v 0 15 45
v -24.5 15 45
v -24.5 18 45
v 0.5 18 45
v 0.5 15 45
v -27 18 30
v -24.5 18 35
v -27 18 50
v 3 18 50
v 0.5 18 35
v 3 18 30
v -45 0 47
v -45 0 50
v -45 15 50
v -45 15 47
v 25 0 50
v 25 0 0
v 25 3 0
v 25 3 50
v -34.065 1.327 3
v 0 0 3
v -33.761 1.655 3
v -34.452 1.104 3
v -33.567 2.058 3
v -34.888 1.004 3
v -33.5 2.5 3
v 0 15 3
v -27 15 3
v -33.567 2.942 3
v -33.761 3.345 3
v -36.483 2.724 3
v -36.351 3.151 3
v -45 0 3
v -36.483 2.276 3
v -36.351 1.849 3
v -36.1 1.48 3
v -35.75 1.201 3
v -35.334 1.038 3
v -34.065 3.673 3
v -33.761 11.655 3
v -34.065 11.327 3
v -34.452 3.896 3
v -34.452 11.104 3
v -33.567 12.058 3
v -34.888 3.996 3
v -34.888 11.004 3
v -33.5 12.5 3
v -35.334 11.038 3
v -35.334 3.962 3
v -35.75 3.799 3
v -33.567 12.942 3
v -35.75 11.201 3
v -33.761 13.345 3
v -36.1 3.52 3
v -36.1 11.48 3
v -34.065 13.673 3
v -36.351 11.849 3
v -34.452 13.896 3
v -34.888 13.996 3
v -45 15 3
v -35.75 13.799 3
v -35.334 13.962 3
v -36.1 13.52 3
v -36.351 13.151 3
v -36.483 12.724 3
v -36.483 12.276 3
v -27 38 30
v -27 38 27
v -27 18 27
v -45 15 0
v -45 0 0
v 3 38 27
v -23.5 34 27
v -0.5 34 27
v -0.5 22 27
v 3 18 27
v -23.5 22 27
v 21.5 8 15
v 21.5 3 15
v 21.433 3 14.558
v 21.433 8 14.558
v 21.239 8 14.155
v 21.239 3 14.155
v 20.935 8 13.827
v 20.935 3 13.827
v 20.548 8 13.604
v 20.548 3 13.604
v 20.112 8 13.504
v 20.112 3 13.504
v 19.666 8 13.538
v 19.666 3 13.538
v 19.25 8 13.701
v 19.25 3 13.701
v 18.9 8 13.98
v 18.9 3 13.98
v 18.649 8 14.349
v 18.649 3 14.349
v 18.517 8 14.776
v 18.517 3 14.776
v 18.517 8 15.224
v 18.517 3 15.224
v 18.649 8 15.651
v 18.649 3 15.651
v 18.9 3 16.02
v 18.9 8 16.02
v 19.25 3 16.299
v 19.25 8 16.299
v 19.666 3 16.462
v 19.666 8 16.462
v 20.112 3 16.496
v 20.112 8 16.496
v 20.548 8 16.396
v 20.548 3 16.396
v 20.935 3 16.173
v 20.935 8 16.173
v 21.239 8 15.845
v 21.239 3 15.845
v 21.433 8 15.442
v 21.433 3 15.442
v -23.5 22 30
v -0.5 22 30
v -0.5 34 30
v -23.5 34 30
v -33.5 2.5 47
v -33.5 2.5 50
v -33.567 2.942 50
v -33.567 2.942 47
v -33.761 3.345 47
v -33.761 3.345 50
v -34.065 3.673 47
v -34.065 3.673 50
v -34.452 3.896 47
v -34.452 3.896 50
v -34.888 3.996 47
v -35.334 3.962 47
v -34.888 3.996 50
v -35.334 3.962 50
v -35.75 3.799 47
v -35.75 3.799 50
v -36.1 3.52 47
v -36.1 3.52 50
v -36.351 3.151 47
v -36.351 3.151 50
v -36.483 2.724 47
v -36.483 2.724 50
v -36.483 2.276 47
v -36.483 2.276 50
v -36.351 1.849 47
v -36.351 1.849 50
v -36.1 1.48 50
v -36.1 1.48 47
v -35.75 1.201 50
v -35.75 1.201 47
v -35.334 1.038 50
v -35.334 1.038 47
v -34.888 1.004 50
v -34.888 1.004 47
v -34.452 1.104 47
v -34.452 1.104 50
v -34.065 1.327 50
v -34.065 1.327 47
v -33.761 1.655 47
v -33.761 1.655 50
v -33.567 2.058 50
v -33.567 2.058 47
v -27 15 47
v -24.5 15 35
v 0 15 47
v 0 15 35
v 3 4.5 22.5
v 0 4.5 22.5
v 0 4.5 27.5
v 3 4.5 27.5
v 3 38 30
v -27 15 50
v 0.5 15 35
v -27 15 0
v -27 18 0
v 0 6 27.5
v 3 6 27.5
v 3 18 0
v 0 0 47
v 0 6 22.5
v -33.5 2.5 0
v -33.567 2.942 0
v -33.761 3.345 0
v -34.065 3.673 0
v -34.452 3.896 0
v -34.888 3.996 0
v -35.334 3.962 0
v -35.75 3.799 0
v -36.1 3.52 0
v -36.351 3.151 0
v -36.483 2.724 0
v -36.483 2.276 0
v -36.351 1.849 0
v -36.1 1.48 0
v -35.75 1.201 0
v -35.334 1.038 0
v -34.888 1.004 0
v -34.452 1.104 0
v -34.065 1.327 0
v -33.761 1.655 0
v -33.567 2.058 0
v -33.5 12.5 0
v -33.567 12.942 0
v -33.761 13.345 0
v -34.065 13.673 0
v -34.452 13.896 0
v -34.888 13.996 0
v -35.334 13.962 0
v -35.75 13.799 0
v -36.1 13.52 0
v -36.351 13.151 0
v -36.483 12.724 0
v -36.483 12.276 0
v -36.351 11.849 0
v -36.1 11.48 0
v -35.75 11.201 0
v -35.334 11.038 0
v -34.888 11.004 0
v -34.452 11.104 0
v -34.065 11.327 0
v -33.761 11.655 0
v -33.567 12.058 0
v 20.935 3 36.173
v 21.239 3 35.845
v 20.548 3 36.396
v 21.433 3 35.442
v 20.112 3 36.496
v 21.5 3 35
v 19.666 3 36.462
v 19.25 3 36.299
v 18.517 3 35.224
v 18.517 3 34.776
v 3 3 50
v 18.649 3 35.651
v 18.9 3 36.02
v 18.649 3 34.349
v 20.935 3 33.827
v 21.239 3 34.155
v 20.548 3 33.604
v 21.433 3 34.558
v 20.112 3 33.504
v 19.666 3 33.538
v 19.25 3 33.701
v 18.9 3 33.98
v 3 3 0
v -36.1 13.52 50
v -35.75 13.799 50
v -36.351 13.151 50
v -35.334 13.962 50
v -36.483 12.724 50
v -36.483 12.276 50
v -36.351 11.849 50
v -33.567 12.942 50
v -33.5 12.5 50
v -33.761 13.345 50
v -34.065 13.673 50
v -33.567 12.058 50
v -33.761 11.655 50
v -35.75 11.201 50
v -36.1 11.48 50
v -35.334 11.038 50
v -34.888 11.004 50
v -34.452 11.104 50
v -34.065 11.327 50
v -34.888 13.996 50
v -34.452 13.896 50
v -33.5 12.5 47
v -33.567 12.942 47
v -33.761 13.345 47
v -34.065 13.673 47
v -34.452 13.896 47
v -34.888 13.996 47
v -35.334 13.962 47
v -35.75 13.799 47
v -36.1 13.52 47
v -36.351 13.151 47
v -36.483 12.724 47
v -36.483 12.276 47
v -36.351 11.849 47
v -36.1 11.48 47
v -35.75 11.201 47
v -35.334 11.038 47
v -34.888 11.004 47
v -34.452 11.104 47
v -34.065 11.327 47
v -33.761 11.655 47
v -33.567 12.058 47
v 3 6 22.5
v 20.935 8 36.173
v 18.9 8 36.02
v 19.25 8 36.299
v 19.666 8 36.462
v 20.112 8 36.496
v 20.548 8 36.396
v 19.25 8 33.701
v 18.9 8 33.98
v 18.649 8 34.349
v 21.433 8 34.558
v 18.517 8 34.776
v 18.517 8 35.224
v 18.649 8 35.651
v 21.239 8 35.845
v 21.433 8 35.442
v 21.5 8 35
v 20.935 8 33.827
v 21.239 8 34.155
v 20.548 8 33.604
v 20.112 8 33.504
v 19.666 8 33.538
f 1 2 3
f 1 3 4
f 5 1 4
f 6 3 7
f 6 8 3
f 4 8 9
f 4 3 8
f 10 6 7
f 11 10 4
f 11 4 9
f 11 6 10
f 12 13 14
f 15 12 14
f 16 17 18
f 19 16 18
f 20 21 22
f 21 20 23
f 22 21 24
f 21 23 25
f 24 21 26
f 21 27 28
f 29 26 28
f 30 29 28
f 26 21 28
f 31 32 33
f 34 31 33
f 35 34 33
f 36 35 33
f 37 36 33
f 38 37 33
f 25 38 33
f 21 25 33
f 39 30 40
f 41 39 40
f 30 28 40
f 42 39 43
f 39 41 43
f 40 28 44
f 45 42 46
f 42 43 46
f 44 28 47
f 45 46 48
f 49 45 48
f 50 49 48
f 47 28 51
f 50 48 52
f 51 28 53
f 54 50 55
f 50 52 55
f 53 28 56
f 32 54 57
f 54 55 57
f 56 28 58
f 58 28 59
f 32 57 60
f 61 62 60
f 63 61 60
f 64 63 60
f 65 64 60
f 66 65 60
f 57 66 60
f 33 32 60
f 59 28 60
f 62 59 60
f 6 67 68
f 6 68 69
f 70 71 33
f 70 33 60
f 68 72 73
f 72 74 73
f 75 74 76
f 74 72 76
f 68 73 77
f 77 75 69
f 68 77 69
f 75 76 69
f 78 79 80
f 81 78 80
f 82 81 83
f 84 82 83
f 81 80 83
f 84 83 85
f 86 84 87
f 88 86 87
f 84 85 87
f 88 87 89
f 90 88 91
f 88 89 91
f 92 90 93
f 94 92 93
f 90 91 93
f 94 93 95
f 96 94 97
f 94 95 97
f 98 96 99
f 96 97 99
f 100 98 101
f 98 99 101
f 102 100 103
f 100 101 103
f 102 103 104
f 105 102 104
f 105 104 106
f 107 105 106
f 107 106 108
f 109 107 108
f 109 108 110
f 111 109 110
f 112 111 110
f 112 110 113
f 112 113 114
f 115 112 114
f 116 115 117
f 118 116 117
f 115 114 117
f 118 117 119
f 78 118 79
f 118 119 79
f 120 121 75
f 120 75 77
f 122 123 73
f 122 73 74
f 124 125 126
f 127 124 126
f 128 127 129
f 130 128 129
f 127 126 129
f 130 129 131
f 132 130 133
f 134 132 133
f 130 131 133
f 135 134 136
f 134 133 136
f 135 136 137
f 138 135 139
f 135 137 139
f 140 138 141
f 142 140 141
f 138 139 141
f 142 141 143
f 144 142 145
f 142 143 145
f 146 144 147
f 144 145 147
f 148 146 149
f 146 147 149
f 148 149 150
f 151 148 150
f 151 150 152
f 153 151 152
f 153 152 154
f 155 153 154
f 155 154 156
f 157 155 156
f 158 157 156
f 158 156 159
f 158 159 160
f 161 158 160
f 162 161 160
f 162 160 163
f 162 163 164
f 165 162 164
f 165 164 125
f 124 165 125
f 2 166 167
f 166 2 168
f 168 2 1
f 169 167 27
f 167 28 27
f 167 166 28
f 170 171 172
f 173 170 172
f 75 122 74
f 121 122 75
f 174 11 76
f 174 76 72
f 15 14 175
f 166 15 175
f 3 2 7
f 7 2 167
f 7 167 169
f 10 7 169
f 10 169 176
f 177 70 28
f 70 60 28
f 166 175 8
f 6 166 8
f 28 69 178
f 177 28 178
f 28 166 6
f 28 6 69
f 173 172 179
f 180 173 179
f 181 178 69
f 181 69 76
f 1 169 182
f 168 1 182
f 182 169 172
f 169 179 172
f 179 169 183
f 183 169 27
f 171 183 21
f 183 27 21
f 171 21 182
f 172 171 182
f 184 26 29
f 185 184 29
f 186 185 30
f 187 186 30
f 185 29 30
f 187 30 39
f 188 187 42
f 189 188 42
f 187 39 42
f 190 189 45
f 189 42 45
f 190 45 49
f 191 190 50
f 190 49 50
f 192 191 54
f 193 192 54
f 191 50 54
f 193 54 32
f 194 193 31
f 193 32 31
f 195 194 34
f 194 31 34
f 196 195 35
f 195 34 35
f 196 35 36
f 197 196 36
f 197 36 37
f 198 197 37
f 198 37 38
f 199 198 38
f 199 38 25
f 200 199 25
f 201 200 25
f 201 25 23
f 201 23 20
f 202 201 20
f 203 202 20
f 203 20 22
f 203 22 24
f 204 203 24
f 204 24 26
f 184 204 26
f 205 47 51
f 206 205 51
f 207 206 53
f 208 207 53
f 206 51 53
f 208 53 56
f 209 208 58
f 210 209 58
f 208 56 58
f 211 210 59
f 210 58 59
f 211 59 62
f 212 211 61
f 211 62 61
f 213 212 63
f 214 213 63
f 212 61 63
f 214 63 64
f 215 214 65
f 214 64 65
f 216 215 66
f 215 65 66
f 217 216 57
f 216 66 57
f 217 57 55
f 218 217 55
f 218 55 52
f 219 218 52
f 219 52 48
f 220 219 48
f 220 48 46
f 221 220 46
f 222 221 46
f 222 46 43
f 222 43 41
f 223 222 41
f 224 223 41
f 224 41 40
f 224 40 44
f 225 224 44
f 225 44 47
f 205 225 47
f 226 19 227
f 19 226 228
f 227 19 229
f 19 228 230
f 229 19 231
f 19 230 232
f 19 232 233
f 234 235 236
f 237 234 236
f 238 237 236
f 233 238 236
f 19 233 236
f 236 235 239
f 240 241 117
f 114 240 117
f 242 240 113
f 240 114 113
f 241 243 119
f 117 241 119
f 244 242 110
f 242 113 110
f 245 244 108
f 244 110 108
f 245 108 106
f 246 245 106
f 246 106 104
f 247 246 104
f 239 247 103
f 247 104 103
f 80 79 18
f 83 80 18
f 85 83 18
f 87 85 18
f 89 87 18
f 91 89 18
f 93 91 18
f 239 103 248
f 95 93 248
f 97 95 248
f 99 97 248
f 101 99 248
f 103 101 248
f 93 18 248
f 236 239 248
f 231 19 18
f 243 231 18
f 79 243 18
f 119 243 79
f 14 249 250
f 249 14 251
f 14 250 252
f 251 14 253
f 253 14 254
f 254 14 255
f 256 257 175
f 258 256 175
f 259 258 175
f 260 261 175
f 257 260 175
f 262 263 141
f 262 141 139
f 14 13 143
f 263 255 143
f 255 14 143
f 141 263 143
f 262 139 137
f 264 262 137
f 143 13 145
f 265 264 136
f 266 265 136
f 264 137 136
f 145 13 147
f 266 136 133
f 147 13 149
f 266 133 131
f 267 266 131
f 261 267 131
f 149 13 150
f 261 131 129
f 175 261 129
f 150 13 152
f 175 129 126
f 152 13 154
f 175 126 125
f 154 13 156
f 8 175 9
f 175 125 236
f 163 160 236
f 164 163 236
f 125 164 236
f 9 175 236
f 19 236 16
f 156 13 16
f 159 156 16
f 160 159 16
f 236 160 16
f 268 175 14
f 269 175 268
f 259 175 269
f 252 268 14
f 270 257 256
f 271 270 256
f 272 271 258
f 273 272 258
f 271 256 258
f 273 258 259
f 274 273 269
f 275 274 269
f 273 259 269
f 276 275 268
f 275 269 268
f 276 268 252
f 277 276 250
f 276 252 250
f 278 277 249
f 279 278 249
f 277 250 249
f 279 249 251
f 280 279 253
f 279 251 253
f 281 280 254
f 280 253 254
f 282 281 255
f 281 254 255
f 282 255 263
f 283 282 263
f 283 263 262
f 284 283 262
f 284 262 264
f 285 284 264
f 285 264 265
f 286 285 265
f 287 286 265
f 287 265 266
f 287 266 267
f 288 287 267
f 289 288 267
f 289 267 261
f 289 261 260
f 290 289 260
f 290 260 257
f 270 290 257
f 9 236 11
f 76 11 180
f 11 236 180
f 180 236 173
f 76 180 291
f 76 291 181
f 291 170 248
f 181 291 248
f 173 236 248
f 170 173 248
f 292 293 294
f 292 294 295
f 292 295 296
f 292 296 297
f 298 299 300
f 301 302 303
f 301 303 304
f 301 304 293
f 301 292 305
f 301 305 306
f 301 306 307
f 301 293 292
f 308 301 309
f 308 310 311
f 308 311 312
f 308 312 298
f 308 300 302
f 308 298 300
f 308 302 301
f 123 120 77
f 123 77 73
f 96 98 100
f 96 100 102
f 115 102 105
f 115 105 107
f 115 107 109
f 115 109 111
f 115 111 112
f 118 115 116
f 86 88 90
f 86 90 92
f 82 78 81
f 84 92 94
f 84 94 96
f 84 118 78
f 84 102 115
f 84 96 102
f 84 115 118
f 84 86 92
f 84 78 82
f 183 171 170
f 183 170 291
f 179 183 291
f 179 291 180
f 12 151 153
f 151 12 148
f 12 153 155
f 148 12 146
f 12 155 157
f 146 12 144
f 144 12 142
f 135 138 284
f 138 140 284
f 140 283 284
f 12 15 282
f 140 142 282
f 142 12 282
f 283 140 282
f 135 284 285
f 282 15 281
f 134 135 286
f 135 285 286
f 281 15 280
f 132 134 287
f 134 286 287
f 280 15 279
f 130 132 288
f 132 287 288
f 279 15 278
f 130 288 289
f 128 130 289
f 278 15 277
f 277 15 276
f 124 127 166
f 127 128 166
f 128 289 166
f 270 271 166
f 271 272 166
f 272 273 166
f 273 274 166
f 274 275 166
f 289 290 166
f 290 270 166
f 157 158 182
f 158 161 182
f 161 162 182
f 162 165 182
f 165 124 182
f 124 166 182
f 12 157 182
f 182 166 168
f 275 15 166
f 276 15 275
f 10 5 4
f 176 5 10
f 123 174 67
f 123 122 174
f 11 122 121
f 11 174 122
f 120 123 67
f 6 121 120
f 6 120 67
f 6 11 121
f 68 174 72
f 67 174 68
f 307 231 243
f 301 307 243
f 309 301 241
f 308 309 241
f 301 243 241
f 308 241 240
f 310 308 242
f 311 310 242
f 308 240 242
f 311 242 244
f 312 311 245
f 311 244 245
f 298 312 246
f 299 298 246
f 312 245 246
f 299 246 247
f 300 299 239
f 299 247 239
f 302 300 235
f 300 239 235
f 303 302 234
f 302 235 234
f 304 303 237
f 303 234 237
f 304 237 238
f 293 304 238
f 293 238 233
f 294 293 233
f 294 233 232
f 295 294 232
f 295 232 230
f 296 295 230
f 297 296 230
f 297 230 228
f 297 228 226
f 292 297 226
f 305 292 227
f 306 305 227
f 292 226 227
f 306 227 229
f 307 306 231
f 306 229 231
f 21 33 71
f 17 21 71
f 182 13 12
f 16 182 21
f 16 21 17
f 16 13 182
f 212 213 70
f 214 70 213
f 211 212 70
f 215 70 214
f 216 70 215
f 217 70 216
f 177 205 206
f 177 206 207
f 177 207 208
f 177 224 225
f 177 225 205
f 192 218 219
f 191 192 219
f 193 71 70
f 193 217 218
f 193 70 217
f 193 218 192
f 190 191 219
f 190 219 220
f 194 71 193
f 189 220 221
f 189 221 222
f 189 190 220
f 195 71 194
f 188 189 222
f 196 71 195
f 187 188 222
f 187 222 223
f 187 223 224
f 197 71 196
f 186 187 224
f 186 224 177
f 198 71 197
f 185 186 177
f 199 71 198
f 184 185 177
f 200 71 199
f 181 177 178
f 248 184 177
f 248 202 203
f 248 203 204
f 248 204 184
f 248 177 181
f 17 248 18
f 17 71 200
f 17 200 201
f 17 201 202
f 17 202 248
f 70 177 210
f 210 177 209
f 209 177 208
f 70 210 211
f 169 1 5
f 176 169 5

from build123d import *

# Parameters (mm, degrees)
BOSS_EXTRUDE1_DEPTH     = 50
SKETCH2_R               = 1.5
BOSS_EXTRUDE2_DEPTH     = 5
SKETCH3_W               = 5
SKETCH3_H               = 1.5
CUT_EXTRUDE1_DEPTH      = 58.879184514
CUT_EXTRUDE1_DEPTH_BACK = 58.879184514
SKETCH4_W               = 45
SKETCH4_H               = 15
BOSS_EXTRUDE3_DEPTH     = 3
SKETCH5_W               = 45
SKETCH5_H               = 15
BOSS_EXTRUDE4_DEPTH     = 3
SKETCH6_R               = 1.5
CUT_EXTRUDE2_DEPTH      = 69.92024376
CUT_EXTRUDE2_DEPTH_BACK = 69.92024376
SKETCH8_W               = 30
SKETCH8_H               = 50
SKETCH8_W_2             = 25
SKETCH8_H_2             = 10
BOSS_EXTRUDE7_DEPTH     = 3
SERVO_MOUNT_DEPTH       = 3


with BuildPart() as part:
    # Sketch1 → Boss-Extrude1 (new body)
    with BuildSketch(Plane.XY):
        Polygon((0, 0), (25, 0), (25, 3), (3, 3), (3, 15), (0, 15), align=None)
    extrude(amount=BOSS_EXTRUDE1_DEPTH)

    # Sketch2 → Boss-Extrude2 (add)
    with BuildSketch(Plane(origin=(0, 3, 0), x_dir=(1, 0, 0), z_dir=(0, 1, 0))):
        with Locations((20, -15)):
            Circle(SKETCH2_R)
        with Locations((20, -35)):
            Circle(SKETCH2_R)
    extrude(amount=BOSS_EXTRUDE2_DEPTH)

    # Sketch3 → Cut-Extrude1 (cut, two sides)
    with BuildSketch(Plane.ZY) as cut_extrude1_sk:
        with Locations((25, 5.25)):
            Rectangle(SKETCH3_W, SKETCH3_H)
    extrude(amount=CUT_EXTRUDE1_DEPTH, mode=Mode.SUBTRACT)
    extrude(cut_extrude1_sk.sketch, amount=-CUT_EXTRUDE1_DEPTH_BACK, mode=Mode.SUBTRACT)

    # Sketch4 → Boss-Extrude3 (add)
    with BuildSketch(Plane(origin=(0, 0, 0), x_dir=(-1, 0, 0), z_dir=(0, 0, -1))):
        with Locations((22.5, 7.5)):
            Rectangle(SKETCH4_W, SKETCH4_H)
    extrude(amount=-BOSS_EXTRUDE3_DEPTH)

    # Sketch5 → Boss-Extrude4 (add)
    with BuildSketch(Plane.XY.offset(50)):
        with Locations((-22.5, 7.5)):
            Rectangle(SKETCH5_W, SKETCH5_H)
    extrude(amount=-BOSS_EXTRUDE4_DEPTH)

    # Sketch6 → Cut-Extrude2 (cut, two sides)
    with BuildSketch(Plane.XY.offset(50)) as cut_extrude2_sk:
        with Locations((-35, 12.5)):
            Circle(SKETCH6_R)
        with Locations((-35, 2.5)):
            Circle(SKETCH6_R)
    extrude(amount=CUT_EXTRUDE2_DEPTH, mode=Mode.SUBTRACT)
    extrude(cut_extrude2_sk.sketch, amount=-CUT_EXTRUDE2_DEPTH_BACK, mode=Mode.SUBTRACT)

    # Sketch8 → Boss-Extrude7 (add)
    with BuildSketch(Plane(origin=(0, 15, 0), x_dir=(1, 0, 0), z_dir=(0, 1, 0))):
        with Locations((-12, -25)):
            Rectangle(SKETCH8_W, SKETCH8_H)
        with Locations((-12, -40)):
            Rectangle(SKETCH8_W_2, SKETCH8_H_2, mode=Mode.SUBTRACT)
    extrude(amount=BOSS_EXTRUDE7_DEPTH)

    # 3DSketch1 → servo mount (add)
    with BuildSketch(Plane(origin=(-27, 18, 30), x_dir=(0.8320502943378437, 0.5547001962252291, 0), z_dir=(0, 0, -1))):
        Polygon((0, 0), (24.96150883, 16.641005887), (36.055512755, 0), (11.094003925, -16.641005887), align=None)
        Polygon((11.78737917, -11.371354023), (30.92453594, 1.386750491), (24.268133585, 11.371354023), (5.130976815, -1.386750491), align=None, mode=Mode.SUBTRACT)
    extrude(amount=SERVO_MOUNT_DEPTH)


solid = part.part
